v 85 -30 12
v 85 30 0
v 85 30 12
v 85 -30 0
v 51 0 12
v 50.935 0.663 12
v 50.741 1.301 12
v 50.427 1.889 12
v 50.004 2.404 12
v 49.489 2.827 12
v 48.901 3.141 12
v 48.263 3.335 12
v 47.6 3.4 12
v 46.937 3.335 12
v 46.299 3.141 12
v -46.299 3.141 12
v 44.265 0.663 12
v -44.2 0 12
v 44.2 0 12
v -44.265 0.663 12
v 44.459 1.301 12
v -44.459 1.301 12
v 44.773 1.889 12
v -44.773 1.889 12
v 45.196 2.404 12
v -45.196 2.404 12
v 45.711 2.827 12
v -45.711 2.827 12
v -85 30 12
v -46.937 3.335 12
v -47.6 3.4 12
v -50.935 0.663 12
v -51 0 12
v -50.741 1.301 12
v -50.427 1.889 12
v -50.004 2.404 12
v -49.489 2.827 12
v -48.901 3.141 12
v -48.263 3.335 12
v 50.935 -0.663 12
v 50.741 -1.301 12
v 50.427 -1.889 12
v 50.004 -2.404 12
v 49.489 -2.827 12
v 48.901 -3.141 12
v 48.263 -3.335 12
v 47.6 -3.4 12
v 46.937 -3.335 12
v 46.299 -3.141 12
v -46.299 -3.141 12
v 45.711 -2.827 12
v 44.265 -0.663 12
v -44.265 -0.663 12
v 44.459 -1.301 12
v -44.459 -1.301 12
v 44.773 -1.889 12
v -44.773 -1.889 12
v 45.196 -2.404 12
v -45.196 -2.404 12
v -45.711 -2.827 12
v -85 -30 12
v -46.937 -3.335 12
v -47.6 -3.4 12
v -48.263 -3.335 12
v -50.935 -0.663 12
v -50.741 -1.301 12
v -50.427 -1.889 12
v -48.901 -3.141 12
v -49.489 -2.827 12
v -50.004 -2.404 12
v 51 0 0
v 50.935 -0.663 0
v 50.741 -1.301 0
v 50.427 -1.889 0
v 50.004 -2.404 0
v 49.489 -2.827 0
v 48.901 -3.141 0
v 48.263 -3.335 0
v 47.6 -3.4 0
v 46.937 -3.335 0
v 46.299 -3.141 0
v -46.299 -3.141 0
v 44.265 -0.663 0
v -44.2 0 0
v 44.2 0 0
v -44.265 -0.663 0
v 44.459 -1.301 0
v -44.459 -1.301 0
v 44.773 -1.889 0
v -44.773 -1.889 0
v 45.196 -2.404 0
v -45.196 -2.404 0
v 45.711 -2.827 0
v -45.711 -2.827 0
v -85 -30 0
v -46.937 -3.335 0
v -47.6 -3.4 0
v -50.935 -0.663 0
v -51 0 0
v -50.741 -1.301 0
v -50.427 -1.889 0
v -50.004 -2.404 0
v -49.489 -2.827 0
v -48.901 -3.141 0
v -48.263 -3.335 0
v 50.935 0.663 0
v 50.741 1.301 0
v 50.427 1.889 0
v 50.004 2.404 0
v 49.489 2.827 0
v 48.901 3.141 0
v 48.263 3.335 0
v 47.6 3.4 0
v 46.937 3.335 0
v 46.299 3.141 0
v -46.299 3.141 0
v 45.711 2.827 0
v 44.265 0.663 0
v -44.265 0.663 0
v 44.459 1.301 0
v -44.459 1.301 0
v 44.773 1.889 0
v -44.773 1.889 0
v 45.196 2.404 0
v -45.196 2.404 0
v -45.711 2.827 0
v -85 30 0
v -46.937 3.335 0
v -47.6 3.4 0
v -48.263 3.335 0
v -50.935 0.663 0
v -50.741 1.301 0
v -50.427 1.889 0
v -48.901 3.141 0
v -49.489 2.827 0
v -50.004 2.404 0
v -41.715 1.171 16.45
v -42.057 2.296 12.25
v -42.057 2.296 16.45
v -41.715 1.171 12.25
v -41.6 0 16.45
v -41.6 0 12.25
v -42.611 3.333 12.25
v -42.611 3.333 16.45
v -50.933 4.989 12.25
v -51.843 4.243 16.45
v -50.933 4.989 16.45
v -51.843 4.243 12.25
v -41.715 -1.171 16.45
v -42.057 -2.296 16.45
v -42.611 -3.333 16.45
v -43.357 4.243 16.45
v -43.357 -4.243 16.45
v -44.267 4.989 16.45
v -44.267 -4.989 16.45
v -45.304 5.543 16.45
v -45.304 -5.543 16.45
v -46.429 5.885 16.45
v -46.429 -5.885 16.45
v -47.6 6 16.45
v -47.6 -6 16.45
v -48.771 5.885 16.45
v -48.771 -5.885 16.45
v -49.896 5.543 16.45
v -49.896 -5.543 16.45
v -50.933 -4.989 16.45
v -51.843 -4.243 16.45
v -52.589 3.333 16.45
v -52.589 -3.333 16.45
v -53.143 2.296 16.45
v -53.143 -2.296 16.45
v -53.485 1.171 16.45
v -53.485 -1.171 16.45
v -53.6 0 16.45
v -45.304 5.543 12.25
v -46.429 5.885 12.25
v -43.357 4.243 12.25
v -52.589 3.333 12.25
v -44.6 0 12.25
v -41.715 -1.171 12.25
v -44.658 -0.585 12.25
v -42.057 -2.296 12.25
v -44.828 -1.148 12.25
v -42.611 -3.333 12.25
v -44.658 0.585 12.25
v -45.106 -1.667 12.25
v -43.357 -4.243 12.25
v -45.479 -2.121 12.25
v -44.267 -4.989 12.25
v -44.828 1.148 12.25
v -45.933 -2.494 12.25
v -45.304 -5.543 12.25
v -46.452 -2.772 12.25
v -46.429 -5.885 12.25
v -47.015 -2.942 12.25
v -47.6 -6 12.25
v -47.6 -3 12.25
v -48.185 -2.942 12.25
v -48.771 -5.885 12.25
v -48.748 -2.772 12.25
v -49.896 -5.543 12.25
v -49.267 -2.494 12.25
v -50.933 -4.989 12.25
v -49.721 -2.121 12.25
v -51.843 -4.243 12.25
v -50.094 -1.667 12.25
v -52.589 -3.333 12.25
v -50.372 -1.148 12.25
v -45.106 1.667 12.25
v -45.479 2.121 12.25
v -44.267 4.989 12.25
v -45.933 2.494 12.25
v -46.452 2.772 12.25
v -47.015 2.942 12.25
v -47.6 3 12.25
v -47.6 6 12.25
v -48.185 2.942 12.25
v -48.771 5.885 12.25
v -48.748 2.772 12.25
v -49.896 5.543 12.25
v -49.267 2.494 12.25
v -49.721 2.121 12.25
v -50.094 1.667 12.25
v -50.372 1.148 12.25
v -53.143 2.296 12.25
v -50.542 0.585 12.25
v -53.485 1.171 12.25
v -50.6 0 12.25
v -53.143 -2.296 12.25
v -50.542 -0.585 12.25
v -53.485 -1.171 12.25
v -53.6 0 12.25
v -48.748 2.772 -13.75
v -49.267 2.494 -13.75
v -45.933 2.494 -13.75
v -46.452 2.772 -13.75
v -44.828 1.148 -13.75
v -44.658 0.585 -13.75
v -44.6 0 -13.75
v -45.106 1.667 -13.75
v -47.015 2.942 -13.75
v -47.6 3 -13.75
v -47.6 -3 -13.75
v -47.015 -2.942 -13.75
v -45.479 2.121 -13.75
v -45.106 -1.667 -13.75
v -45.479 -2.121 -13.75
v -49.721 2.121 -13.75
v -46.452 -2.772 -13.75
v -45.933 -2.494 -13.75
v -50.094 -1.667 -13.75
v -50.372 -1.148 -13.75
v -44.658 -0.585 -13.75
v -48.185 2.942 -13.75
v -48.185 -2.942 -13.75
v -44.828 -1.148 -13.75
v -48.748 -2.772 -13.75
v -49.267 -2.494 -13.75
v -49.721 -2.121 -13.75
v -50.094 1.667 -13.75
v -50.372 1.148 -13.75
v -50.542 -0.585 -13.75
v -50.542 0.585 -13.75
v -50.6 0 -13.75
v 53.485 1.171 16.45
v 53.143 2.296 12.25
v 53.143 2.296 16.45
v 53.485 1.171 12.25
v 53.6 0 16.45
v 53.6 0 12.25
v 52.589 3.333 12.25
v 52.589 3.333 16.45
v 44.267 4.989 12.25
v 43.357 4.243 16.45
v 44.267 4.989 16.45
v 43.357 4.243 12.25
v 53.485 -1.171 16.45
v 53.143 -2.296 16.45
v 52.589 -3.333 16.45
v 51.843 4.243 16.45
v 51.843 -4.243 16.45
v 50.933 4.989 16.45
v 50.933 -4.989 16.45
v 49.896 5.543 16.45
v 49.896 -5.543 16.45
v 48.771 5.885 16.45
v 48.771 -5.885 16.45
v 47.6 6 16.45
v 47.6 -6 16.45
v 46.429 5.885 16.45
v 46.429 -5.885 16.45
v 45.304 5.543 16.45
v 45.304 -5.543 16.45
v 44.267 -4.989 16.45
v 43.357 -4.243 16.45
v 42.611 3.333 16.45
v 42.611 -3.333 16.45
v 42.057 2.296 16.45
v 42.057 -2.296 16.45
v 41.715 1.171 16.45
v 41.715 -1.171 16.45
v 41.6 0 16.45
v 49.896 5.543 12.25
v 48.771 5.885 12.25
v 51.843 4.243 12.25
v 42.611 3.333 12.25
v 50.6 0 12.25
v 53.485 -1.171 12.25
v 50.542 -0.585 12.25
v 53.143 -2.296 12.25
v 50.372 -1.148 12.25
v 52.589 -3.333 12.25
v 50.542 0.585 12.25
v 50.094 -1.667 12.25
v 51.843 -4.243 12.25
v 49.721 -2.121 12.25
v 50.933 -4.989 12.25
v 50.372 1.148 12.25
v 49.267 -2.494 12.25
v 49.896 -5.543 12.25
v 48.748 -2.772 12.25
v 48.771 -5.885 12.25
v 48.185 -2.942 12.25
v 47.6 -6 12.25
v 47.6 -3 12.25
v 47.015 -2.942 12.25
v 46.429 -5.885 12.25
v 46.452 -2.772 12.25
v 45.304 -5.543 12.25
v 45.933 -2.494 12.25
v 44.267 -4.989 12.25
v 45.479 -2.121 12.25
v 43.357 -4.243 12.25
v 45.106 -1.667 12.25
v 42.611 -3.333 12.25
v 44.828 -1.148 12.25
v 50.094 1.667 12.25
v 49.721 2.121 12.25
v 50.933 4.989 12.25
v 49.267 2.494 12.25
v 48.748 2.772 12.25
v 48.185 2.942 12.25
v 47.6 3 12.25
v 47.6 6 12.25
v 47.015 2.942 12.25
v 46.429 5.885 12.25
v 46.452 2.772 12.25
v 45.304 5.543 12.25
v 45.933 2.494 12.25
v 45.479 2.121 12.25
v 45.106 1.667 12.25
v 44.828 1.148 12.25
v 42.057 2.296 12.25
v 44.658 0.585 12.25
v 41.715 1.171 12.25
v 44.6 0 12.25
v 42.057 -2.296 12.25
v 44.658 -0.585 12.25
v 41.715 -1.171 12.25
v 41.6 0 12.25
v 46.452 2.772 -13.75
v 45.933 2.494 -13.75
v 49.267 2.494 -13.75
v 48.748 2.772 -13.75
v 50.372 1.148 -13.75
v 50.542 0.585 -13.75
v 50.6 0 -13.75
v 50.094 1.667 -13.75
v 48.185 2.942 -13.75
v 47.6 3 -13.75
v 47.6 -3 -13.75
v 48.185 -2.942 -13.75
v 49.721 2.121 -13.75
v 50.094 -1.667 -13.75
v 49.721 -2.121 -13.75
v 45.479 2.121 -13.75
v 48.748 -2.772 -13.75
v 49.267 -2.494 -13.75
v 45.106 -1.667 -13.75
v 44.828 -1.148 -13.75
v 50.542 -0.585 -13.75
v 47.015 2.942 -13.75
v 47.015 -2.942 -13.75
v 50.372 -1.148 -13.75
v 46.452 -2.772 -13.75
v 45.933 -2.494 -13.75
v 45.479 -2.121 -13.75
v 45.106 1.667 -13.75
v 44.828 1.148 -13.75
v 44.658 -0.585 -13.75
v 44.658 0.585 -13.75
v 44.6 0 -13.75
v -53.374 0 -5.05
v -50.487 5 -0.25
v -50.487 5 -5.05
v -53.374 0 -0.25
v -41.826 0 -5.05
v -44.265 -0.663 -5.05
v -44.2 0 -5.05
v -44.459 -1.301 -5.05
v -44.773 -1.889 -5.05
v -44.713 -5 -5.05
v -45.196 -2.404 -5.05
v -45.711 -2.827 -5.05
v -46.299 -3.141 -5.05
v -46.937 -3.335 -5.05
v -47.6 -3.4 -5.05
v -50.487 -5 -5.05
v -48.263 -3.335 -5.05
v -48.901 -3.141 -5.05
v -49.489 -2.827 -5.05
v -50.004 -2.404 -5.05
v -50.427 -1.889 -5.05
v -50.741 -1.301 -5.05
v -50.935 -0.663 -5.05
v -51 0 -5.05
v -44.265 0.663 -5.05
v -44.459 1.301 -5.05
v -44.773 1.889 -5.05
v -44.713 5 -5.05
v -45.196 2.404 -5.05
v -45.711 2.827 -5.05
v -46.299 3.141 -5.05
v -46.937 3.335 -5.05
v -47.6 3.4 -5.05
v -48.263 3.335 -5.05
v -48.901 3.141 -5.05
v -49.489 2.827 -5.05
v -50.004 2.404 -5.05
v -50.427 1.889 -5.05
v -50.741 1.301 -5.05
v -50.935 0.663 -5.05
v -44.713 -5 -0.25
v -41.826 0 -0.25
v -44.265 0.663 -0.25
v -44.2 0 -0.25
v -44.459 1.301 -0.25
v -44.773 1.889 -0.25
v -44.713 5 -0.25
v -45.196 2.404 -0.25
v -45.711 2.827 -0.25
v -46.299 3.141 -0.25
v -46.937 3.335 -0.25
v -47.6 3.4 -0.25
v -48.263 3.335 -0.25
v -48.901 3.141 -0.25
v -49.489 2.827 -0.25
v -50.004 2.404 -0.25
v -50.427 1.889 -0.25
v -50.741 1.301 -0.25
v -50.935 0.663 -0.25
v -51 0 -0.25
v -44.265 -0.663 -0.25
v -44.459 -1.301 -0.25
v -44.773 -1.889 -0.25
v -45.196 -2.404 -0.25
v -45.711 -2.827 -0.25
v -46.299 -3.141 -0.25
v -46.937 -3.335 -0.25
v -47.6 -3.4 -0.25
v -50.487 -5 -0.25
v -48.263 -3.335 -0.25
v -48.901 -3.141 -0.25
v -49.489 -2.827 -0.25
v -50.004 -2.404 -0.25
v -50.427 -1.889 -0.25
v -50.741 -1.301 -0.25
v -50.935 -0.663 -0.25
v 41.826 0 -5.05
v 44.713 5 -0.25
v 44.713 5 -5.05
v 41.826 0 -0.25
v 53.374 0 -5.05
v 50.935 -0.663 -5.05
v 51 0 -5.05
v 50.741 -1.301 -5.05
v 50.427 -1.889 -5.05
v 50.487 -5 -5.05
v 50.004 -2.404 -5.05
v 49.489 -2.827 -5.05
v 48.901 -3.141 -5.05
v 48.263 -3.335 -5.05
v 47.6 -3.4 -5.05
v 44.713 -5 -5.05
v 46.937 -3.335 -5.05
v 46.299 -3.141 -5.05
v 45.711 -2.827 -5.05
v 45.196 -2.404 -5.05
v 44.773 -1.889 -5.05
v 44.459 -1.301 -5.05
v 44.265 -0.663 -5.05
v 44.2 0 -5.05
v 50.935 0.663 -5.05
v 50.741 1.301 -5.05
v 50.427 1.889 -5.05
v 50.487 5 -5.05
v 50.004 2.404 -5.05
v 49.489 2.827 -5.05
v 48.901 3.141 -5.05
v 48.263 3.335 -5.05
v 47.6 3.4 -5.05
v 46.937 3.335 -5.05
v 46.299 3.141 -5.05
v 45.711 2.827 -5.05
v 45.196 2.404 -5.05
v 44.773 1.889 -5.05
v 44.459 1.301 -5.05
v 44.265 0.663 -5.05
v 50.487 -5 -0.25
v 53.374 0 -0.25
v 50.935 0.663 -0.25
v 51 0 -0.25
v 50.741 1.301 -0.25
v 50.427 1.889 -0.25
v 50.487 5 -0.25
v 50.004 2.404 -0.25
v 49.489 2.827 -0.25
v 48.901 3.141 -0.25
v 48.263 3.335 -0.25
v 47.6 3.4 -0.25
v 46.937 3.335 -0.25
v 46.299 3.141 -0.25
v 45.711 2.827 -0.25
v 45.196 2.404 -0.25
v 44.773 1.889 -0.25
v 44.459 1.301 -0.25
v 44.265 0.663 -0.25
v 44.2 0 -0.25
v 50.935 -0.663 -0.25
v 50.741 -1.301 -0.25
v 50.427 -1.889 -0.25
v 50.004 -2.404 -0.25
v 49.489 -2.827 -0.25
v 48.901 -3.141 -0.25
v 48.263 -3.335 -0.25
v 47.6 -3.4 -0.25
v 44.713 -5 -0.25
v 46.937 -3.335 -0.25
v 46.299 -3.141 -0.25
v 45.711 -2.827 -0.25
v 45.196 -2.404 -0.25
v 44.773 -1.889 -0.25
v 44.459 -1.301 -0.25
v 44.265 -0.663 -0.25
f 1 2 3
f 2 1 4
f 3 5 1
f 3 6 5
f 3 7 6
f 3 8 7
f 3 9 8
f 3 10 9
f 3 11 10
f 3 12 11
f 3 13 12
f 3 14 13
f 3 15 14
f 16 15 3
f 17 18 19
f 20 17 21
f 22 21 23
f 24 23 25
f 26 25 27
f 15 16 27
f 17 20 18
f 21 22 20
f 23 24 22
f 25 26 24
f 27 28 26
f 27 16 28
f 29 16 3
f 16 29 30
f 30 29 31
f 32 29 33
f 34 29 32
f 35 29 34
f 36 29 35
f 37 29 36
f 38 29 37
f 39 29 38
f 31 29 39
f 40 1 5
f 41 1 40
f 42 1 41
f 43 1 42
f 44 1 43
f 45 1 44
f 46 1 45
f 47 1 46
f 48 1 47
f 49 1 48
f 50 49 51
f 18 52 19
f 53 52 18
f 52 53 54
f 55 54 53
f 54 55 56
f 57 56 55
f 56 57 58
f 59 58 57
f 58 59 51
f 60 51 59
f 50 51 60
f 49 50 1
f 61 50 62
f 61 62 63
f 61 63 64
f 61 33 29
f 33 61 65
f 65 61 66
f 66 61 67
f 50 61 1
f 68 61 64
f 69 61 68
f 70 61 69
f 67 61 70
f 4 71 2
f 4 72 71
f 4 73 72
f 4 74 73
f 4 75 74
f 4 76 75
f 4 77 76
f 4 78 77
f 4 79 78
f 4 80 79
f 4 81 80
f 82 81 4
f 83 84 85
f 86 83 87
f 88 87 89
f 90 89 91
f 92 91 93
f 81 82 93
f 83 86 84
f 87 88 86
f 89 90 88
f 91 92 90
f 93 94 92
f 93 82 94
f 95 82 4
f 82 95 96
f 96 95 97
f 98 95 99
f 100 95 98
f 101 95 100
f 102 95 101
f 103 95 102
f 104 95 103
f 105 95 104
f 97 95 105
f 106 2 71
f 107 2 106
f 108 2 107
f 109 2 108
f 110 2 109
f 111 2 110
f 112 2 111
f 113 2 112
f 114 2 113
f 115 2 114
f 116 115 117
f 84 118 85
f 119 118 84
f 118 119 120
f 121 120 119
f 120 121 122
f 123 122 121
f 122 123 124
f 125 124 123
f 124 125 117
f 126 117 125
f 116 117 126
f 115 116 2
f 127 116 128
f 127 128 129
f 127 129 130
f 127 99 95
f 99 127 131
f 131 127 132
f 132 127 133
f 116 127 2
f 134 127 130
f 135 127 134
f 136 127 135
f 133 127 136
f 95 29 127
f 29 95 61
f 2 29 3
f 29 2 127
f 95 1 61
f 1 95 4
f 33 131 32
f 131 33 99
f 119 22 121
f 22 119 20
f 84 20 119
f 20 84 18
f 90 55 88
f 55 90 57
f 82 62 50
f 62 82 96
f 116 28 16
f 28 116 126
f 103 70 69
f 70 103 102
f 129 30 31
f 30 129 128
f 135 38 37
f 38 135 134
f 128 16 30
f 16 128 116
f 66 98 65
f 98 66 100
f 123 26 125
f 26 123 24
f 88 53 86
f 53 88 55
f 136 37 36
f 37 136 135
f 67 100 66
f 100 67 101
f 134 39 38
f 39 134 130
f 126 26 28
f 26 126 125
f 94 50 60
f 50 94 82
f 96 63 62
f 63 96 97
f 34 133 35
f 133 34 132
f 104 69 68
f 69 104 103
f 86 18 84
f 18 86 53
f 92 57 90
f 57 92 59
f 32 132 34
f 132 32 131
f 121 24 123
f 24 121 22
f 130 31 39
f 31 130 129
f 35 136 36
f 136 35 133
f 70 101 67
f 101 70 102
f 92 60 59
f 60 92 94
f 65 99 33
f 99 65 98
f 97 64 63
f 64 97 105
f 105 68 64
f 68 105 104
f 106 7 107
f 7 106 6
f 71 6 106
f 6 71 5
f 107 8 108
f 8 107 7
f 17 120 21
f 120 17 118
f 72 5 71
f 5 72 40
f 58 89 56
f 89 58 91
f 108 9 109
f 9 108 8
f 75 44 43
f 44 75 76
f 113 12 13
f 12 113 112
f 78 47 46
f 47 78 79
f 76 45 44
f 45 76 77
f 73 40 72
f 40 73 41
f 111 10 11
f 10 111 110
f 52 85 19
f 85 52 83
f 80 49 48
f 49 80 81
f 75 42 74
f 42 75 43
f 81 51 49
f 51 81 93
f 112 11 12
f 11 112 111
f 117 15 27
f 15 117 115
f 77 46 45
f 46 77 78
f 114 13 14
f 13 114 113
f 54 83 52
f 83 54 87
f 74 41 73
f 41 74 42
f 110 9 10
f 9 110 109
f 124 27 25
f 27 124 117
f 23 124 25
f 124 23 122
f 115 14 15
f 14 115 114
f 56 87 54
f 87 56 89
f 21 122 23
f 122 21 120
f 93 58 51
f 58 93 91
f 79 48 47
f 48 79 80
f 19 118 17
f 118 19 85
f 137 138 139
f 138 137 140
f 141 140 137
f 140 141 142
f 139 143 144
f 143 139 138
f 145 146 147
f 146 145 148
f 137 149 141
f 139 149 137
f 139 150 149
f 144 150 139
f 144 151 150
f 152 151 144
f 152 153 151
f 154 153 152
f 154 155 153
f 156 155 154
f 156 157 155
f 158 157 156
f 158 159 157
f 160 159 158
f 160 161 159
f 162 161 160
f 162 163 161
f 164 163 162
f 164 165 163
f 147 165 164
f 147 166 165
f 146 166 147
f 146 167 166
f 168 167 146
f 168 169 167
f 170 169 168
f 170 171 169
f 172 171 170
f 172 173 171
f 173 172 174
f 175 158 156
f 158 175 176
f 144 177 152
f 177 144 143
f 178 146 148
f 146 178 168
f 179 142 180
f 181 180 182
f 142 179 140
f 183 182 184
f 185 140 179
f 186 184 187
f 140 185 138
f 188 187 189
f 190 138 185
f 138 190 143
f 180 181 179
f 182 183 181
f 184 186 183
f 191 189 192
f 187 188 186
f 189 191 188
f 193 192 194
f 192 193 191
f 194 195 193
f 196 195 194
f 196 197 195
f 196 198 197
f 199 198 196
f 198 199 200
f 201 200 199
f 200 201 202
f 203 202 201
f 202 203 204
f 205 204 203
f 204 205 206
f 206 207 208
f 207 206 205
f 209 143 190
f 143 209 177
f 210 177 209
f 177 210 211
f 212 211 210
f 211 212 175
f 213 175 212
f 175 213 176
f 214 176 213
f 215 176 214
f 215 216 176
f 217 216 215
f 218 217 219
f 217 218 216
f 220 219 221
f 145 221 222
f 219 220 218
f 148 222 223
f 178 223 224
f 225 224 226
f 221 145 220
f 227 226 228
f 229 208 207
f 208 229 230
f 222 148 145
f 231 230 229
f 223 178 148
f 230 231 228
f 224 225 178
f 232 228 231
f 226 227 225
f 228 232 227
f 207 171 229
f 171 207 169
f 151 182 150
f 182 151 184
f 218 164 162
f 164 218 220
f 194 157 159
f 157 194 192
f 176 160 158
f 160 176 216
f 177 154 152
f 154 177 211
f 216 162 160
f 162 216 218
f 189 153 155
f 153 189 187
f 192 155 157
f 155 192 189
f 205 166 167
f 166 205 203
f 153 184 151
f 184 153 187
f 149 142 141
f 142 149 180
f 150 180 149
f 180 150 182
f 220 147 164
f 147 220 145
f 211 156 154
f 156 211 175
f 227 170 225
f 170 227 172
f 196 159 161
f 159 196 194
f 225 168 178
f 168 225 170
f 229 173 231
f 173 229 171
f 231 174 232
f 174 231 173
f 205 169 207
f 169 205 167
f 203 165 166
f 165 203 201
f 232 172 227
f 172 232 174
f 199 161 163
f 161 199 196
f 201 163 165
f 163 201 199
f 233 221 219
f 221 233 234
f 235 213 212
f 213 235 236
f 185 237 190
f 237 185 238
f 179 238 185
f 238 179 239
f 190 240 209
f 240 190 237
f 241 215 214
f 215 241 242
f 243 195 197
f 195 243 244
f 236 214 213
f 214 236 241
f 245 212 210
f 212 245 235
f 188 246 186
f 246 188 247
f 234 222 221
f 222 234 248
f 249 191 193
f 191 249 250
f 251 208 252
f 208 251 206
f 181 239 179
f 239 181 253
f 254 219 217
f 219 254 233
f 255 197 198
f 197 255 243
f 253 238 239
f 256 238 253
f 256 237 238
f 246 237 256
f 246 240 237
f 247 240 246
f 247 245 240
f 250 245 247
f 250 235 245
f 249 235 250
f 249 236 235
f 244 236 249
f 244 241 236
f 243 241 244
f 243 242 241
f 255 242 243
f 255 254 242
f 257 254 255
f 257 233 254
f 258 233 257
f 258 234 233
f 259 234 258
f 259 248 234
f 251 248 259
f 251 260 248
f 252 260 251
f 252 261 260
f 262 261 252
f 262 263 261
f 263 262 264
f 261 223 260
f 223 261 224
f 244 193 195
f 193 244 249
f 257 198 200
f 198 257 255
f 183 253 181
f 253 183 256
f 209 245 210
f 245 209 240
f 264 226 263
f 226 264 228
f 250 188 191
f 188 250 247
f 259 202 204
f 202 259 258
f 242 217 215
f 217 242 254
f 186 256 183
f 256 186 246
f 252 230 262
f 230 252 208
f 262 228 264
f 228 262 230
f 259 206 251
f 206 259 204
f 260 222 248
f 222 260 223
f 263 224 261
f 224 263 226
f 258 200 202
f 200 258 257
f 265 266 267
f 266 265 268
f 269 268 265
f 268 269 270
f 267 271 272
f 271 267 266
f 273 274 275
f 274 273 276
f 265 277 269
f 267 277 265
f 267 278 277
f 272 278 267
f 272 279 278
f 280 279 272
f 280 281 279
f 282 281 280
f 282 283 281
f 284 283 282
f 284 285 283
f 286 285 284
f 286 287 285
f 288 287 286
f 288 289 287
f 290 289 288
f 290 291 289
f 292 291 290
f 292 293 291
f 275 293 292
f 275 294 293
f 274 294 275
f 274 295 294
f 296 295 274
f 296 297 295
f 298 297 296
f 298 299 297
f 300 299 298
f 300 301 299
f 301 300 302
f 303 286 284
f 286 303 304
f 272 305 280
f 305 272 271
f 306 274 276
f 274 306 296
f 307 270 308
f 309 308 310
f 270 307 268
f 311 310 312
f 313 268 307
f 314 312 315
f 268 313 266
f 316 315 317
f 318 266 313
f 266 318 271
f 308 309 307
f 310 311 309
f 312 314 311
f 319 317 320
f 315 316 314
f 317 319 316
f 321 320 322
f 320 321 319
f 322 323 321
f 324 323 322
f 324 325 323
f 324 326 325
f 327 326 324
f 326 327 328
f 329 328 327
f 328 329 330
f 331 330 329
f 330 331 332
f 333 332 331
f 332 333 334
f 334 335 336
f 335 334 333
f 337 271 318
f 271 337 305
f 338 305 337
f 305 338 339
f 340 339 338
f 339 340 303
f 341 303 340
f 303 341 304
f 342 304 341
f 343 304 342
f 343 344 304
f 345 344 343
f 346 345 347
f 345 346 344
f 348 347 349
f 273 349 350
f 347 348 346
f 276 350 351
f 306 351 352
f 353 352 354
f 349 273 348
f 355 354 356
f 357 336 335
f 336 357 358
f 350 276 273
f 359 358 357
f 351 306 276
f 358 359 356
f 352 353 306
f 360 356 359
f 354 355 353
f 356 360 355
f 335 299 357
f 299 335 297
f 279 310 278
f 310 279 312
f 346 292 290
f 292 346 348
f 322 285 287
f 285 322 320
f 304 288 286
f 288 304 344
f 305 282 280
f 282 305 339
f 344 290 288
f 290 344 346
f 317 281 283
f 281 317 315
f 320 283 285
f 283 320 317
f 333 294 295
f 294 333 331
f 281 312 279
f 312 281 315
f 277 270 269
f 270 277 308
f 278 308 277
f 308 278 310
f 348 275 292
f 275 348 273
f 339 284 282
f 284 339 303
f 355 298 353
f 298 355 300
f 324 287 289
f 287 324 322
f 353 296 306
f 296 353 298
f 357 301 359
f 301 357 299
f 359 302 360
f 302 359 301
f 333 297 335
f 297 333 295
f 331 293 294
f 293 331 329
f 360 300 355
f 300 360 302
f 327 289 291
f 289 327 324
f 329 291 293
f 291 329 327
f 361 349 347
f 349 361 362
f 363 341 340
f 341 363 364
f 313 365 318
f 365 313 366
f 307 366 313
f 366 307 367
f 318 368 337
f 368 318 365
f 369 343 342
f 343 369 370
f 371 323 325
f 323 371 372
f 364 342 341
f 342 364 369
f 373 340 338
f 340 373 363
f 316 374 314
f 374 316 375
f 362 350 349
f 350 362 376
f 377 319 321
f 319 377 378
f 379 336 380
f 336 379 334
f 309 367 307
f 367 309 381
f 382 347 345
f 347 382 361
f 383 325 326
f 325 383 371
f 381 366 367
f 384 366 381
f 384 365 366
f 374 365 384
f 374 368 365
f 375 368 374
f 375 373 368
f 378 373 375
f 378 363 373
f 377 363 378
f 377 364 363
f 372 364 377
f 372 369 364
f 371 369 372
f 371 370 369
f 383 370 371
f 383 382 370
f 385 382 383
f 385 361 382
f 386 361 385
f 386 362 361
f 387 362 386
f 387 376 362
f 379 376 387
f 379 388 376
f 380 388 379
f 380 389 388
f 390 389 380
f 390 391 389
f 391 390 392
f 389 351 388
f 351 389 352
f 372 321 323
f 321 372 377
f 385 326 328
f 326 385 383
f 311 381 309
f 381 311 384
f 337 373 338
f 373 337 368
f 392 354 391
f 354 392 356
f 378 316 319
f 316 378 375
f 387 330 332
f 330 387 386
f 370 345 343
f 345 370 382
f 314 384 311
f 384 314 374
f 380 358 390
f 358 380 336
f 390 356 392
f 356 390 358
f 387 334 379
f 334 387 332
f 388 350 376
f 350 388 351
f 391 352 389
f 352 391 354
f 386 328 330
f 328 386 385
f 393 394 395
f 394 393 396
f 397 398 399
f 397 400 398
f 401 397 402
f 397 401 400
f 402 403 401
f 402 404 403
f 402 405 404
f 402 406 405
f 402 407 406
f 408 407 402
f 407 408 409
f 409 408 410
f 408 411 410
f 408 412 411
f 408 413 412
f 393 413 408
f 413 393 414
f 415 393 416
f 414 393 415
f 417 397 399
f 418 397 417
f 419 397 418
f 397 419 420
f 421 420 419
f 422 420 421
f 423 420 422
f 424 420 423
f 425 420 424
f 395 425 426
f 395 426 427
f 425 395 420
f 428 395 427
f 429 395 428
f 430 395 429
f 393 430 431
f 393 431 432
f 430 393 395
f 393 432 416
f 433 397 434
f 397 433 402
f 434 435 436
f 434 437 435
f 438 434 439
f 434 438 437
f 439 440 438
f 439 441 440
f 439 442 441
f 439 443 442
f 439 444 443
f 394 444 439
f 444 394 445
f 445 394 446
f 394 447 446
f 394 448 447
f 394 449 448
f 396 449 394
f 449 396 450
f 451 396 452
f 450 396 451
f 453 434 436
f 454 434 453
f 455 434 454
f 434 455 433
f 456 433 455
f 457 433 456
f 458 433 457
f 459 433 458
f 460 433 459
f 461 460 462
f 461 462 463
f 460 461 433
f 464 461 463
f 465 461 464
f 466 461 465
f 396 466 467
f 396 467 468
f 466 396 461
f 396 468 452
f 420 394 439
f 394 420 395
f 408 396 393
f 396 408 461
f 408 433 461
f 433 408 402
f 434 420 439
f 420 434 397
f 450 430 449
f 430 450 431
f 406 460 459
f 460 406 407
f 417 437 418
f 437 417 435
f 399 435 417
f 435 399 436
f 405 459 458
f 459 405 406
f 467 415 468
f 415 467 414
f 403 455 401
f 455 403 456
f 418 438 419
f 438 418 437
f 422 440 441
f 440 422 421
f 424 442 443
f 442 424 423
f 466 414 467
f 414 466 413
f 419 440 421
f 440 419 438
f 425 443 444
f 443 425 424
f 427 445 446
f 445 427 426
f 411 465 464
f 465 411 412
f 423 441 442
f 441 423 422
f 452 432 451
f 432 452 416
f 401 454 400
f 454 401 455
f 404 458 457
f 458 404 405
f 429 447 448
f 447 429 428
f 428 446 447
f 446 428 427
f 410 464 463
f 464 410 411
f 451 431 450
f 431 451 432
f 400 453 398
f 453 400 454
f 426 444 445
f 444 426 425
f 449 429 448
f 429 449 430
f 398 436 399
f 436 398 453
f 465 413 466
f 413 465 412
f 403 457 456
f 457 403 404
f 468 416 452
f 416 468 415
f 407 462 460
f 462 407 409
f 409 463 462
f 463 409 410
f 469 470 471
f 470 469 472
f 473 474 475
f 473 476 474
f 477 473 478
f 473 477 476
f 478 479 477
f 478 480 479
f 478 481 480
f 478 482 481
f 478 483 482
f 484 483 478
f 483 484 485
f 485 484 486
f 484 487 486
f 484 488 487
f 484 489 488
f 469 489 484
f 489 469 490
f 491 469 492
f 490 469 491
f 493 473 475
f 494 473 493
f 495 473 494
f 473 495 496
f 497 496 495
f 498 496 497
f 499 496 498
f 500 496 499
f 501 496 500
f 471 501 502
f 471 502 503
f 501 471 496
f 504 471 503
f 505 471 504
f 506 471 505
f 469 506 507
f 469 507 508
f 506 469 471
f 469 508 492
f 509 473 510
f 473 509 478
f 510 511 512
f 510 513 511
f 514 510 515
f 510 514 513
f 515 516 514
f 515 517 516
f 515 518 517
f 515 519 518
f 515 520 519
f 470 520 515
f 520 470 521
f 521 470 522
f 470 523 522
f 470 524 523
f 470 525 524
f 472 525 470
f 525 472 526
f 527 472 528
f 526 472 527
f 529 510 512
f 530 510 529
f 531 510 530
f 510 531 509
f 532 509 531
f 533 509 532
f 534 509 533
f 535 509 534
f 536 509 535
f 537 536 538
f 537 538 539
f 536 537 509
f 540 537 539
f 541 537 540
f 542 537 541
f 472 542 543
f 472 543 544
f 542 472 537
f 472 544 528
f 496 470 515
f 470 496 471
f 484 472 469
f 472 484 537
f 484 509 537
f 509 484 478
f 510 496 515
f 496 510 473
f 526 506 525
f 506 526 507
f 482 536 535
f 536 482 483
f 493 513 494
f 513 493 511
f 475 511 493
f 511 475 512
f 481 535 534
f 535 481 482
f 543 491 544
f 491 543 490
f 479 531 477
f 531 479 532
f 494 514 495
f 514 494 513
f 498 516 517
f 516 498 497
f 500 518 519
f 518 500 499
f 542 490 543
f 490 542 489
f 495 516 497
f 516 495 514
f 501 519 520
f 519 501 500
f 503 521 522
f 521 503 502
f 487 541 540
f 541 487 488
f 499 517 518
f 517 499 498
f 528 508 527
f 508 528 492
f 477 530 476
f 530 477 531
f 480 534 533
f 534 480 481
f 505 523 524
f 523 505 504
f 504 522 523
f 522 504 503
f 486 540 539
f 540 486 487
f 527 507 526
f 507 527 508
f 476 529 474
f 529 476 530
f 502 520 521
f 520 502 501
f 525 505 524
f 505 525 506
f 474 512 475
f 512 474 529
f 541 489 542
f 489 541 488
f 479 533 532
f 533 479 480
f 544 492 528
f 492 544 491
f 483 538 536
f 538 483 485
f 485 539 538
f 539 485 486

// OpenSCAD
$fn = 32;

// ------------------------------------------------------------------------
// Bolted plate: 170 x 60 x 12 mm plate, 2 fasteners
// Every part is its own module, assembly() places them once.
// ------------------------------------------------------------------------

// --- part 1 ---
module plate() {
  difference() {
    translate([-85, -30, 0]) cube([170, 60, 12]);
    translate([-47.6, 0, -1]) cylinder(h = 14, d = 6.8);
    translate([47.6, 0, -1]) cylinder(h = 14, d = 6.8);
  }
}

// --- part 2 ---
module bolt1() {
  cylinder(h = 4.2, d = 12);
  translate([0, 0, -26]) cylinder(h = 26, d = 6);
}

// --- part 3 ---
module bolt2() {
  cylinder(h = 4.2, d = 12);
  translate([0, 0, -26]) cylinder(h = 26, d = 6);
}

// --- part 4 ---
module nut1() {
  difference() {
    linear_extrude(height = 4.8) polygon(points = [[5.774, 0], [2.887, 5], [-2.887, 5], [-5.774, 0], [-2.887, -5], [2.887, -5]]);
    translate([0, 0, -1]) cylinder(h = 6.8, d = 6.8);
  }
}

// --- part 5 ---
module nut2() {
  difference() {
    linear_extrude(height = 4.8) polygon(points = [[5.774, 0], [2.887, 5], [-2.887, 5], [-5.774, 0], [-2.887, -5], [2.887, -5]]);
    translate([0, 0, -1]) cylinder(h = 6.8, d = 6.8);
  }
}

// --- assembly ---
module assembly() {
  translate([0, 0, 0]) rotate([0, 0, 0]) plate();
  translate([-47.6, 0, 12.25]) rotate([0, 0, 0]) bolt1();
  translate([47.6, 0, 12.25]) rotate([0, 0, 0]) bolt2();
  translate([-47.6, 0, -5.05]) rotate([0, 0, 0]) nut1();
  translate([47.6, 0, -5.05]) rotate([0, 0, 0]) nut2();
}

assembly();
